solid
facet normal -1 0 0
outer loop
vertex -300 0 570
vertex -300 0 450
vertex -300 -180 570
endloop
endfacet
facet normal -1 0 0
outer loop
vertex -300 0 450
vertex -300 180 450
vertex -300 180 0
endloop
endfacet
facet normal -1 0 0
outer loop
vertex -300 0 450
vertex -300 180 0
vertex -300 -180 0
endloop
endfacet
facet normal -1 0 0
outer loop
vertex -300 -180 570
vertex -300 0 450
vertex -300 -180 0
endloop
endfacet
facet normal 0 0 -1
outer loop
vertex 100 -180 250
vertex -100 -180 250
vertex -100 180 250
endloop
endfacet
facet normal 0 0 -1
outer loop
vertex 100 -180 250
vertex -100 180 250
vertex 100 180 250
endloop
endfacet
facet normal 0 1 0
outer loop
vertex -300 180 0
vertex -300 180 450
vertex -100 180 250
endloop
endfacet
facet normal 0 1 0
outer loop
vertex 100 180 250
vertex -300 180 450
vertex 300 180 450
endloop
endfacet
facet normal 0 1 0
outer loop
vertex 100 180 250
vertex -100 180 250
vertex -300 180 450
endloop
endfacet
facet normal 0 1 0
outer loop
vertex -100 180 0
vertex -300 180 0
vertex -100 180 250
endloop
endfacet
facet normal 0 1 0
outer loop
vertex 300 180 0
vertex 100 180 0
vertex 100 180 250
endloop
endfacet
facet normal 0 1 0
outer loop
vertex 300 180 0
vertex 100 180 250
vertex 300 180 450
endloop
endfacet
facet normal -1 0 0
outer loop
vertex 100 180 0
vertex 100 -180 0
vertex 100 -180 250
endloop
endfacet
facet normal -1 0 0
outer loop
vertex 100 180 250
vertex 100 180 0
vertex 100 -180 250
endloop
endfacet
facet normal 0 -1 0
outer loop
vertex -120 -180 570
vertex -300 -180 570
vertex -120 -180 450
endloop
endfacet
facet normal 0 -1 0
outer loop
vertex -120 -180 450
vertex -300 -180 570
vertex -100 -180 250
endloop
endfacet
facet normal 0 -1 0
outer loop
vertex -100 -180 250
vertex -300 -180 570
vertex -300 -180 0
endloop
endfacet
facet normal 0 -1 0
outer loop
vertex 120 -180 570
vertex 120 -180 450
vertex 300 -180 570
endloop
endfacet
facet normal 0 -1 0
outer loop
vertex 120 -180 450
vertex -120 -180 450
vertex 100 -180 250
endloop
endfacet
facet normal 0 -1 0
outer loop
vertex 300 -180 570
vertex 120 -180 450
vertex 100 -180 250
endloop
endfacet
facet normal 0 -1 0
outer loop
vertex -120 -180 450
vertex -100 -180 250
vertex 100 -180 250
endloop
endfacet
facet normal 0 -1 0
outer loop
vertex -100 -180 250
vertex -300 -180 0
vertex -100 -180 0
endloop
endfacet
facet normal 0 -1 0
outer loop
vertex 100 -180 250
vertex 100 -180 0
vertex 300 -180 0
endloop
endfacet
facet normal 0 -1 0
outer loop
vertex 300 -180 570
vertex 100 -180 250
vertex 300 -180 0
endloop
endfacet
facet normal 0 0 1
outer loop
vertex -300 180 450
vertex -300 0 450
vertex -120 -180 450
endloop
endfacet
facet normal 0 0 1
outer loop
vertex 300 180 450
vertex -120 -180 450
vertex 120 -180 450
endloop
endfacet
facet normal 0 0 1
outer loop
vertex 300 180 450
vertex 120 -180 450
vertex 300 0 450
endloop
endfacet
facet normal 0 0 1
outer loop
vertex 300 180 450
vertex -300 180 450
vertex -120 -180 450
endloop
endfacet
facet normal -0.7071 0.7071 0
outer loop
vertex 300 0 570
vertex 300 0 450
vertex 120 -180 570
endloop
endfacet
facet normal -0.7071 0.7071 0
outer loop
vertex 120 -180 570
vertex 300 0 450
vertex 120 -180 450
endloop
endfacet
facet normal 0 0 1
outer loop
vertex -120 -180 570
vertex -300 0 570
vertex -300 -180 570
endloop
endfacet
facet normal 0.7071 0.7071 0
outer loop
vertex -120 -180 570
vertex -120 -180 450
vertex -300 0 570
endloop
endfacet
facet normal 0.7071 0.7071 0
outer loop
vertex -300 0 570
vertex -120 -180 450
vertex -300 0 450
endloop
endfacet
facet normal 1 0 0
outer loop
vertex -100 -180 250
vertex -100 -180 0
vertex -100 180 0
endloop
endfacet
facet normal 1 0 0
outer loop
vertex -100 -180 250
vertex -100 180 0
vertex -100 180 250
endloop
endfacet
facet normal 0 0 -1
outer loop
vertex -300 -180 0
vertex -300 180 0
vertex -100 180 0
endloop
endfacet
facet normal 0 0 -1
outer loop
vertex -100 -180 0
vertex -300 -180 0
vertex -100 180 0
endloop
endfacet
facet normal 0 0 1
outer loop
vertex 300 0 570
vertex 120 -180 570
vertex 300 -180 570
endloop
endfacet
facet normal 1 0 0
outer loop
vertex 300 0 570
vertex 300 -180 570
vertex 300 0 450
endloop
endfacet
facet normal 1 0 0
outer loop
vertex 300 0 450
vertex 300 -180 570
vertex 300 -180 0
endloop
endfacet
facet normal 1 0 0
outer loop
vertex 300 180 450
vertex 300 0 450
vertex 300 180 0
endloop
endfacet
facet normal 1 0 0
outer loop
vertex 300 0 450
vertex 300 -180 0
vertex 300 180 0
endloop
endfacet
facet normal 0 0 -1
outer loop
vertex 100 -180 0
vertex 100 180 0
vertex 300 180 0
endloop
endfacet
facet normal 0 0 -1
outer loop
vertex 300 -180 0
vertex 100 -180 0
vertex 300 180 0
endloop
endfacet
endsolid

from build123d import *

# Parameters (mm, degrees)
F0_W     = 600
F0_H     = 360
F1_DEPTH = 450
F2_W     = 200
F2_H     = 250
F3_DEPTH = 360.001
F5_DEPTH = 120


with BuildPart() as f1:
    # F0 (on Top) → F1 (new body)
    with BuildSketch(Plane.XY):
        Rectangle(F0_W, F0_H)
    extrude(amount=F1_DEPTH)

    # F2 (on face) → F3 (cut, through all)
    with BuildSketch(Plane.XZ.offset(180)):
        with Locations((0, 125)):
            Rectangle(F2_W, F2_H)
    extrude(amount=-F3_DEPTH, mode=Mode.SUBTRACT)

    # F4 (on face) → F5 (join)
    with BuildSketch(Plane.XY.offset(450)):
        Polygon((-300, 0), (-300, -180), (-120, -180), align=None)
        Polygon((300, 0), (120, -180), (300, -180), align=None)
    extrude(amount=F5_DEPTH)


solid = f1.part
